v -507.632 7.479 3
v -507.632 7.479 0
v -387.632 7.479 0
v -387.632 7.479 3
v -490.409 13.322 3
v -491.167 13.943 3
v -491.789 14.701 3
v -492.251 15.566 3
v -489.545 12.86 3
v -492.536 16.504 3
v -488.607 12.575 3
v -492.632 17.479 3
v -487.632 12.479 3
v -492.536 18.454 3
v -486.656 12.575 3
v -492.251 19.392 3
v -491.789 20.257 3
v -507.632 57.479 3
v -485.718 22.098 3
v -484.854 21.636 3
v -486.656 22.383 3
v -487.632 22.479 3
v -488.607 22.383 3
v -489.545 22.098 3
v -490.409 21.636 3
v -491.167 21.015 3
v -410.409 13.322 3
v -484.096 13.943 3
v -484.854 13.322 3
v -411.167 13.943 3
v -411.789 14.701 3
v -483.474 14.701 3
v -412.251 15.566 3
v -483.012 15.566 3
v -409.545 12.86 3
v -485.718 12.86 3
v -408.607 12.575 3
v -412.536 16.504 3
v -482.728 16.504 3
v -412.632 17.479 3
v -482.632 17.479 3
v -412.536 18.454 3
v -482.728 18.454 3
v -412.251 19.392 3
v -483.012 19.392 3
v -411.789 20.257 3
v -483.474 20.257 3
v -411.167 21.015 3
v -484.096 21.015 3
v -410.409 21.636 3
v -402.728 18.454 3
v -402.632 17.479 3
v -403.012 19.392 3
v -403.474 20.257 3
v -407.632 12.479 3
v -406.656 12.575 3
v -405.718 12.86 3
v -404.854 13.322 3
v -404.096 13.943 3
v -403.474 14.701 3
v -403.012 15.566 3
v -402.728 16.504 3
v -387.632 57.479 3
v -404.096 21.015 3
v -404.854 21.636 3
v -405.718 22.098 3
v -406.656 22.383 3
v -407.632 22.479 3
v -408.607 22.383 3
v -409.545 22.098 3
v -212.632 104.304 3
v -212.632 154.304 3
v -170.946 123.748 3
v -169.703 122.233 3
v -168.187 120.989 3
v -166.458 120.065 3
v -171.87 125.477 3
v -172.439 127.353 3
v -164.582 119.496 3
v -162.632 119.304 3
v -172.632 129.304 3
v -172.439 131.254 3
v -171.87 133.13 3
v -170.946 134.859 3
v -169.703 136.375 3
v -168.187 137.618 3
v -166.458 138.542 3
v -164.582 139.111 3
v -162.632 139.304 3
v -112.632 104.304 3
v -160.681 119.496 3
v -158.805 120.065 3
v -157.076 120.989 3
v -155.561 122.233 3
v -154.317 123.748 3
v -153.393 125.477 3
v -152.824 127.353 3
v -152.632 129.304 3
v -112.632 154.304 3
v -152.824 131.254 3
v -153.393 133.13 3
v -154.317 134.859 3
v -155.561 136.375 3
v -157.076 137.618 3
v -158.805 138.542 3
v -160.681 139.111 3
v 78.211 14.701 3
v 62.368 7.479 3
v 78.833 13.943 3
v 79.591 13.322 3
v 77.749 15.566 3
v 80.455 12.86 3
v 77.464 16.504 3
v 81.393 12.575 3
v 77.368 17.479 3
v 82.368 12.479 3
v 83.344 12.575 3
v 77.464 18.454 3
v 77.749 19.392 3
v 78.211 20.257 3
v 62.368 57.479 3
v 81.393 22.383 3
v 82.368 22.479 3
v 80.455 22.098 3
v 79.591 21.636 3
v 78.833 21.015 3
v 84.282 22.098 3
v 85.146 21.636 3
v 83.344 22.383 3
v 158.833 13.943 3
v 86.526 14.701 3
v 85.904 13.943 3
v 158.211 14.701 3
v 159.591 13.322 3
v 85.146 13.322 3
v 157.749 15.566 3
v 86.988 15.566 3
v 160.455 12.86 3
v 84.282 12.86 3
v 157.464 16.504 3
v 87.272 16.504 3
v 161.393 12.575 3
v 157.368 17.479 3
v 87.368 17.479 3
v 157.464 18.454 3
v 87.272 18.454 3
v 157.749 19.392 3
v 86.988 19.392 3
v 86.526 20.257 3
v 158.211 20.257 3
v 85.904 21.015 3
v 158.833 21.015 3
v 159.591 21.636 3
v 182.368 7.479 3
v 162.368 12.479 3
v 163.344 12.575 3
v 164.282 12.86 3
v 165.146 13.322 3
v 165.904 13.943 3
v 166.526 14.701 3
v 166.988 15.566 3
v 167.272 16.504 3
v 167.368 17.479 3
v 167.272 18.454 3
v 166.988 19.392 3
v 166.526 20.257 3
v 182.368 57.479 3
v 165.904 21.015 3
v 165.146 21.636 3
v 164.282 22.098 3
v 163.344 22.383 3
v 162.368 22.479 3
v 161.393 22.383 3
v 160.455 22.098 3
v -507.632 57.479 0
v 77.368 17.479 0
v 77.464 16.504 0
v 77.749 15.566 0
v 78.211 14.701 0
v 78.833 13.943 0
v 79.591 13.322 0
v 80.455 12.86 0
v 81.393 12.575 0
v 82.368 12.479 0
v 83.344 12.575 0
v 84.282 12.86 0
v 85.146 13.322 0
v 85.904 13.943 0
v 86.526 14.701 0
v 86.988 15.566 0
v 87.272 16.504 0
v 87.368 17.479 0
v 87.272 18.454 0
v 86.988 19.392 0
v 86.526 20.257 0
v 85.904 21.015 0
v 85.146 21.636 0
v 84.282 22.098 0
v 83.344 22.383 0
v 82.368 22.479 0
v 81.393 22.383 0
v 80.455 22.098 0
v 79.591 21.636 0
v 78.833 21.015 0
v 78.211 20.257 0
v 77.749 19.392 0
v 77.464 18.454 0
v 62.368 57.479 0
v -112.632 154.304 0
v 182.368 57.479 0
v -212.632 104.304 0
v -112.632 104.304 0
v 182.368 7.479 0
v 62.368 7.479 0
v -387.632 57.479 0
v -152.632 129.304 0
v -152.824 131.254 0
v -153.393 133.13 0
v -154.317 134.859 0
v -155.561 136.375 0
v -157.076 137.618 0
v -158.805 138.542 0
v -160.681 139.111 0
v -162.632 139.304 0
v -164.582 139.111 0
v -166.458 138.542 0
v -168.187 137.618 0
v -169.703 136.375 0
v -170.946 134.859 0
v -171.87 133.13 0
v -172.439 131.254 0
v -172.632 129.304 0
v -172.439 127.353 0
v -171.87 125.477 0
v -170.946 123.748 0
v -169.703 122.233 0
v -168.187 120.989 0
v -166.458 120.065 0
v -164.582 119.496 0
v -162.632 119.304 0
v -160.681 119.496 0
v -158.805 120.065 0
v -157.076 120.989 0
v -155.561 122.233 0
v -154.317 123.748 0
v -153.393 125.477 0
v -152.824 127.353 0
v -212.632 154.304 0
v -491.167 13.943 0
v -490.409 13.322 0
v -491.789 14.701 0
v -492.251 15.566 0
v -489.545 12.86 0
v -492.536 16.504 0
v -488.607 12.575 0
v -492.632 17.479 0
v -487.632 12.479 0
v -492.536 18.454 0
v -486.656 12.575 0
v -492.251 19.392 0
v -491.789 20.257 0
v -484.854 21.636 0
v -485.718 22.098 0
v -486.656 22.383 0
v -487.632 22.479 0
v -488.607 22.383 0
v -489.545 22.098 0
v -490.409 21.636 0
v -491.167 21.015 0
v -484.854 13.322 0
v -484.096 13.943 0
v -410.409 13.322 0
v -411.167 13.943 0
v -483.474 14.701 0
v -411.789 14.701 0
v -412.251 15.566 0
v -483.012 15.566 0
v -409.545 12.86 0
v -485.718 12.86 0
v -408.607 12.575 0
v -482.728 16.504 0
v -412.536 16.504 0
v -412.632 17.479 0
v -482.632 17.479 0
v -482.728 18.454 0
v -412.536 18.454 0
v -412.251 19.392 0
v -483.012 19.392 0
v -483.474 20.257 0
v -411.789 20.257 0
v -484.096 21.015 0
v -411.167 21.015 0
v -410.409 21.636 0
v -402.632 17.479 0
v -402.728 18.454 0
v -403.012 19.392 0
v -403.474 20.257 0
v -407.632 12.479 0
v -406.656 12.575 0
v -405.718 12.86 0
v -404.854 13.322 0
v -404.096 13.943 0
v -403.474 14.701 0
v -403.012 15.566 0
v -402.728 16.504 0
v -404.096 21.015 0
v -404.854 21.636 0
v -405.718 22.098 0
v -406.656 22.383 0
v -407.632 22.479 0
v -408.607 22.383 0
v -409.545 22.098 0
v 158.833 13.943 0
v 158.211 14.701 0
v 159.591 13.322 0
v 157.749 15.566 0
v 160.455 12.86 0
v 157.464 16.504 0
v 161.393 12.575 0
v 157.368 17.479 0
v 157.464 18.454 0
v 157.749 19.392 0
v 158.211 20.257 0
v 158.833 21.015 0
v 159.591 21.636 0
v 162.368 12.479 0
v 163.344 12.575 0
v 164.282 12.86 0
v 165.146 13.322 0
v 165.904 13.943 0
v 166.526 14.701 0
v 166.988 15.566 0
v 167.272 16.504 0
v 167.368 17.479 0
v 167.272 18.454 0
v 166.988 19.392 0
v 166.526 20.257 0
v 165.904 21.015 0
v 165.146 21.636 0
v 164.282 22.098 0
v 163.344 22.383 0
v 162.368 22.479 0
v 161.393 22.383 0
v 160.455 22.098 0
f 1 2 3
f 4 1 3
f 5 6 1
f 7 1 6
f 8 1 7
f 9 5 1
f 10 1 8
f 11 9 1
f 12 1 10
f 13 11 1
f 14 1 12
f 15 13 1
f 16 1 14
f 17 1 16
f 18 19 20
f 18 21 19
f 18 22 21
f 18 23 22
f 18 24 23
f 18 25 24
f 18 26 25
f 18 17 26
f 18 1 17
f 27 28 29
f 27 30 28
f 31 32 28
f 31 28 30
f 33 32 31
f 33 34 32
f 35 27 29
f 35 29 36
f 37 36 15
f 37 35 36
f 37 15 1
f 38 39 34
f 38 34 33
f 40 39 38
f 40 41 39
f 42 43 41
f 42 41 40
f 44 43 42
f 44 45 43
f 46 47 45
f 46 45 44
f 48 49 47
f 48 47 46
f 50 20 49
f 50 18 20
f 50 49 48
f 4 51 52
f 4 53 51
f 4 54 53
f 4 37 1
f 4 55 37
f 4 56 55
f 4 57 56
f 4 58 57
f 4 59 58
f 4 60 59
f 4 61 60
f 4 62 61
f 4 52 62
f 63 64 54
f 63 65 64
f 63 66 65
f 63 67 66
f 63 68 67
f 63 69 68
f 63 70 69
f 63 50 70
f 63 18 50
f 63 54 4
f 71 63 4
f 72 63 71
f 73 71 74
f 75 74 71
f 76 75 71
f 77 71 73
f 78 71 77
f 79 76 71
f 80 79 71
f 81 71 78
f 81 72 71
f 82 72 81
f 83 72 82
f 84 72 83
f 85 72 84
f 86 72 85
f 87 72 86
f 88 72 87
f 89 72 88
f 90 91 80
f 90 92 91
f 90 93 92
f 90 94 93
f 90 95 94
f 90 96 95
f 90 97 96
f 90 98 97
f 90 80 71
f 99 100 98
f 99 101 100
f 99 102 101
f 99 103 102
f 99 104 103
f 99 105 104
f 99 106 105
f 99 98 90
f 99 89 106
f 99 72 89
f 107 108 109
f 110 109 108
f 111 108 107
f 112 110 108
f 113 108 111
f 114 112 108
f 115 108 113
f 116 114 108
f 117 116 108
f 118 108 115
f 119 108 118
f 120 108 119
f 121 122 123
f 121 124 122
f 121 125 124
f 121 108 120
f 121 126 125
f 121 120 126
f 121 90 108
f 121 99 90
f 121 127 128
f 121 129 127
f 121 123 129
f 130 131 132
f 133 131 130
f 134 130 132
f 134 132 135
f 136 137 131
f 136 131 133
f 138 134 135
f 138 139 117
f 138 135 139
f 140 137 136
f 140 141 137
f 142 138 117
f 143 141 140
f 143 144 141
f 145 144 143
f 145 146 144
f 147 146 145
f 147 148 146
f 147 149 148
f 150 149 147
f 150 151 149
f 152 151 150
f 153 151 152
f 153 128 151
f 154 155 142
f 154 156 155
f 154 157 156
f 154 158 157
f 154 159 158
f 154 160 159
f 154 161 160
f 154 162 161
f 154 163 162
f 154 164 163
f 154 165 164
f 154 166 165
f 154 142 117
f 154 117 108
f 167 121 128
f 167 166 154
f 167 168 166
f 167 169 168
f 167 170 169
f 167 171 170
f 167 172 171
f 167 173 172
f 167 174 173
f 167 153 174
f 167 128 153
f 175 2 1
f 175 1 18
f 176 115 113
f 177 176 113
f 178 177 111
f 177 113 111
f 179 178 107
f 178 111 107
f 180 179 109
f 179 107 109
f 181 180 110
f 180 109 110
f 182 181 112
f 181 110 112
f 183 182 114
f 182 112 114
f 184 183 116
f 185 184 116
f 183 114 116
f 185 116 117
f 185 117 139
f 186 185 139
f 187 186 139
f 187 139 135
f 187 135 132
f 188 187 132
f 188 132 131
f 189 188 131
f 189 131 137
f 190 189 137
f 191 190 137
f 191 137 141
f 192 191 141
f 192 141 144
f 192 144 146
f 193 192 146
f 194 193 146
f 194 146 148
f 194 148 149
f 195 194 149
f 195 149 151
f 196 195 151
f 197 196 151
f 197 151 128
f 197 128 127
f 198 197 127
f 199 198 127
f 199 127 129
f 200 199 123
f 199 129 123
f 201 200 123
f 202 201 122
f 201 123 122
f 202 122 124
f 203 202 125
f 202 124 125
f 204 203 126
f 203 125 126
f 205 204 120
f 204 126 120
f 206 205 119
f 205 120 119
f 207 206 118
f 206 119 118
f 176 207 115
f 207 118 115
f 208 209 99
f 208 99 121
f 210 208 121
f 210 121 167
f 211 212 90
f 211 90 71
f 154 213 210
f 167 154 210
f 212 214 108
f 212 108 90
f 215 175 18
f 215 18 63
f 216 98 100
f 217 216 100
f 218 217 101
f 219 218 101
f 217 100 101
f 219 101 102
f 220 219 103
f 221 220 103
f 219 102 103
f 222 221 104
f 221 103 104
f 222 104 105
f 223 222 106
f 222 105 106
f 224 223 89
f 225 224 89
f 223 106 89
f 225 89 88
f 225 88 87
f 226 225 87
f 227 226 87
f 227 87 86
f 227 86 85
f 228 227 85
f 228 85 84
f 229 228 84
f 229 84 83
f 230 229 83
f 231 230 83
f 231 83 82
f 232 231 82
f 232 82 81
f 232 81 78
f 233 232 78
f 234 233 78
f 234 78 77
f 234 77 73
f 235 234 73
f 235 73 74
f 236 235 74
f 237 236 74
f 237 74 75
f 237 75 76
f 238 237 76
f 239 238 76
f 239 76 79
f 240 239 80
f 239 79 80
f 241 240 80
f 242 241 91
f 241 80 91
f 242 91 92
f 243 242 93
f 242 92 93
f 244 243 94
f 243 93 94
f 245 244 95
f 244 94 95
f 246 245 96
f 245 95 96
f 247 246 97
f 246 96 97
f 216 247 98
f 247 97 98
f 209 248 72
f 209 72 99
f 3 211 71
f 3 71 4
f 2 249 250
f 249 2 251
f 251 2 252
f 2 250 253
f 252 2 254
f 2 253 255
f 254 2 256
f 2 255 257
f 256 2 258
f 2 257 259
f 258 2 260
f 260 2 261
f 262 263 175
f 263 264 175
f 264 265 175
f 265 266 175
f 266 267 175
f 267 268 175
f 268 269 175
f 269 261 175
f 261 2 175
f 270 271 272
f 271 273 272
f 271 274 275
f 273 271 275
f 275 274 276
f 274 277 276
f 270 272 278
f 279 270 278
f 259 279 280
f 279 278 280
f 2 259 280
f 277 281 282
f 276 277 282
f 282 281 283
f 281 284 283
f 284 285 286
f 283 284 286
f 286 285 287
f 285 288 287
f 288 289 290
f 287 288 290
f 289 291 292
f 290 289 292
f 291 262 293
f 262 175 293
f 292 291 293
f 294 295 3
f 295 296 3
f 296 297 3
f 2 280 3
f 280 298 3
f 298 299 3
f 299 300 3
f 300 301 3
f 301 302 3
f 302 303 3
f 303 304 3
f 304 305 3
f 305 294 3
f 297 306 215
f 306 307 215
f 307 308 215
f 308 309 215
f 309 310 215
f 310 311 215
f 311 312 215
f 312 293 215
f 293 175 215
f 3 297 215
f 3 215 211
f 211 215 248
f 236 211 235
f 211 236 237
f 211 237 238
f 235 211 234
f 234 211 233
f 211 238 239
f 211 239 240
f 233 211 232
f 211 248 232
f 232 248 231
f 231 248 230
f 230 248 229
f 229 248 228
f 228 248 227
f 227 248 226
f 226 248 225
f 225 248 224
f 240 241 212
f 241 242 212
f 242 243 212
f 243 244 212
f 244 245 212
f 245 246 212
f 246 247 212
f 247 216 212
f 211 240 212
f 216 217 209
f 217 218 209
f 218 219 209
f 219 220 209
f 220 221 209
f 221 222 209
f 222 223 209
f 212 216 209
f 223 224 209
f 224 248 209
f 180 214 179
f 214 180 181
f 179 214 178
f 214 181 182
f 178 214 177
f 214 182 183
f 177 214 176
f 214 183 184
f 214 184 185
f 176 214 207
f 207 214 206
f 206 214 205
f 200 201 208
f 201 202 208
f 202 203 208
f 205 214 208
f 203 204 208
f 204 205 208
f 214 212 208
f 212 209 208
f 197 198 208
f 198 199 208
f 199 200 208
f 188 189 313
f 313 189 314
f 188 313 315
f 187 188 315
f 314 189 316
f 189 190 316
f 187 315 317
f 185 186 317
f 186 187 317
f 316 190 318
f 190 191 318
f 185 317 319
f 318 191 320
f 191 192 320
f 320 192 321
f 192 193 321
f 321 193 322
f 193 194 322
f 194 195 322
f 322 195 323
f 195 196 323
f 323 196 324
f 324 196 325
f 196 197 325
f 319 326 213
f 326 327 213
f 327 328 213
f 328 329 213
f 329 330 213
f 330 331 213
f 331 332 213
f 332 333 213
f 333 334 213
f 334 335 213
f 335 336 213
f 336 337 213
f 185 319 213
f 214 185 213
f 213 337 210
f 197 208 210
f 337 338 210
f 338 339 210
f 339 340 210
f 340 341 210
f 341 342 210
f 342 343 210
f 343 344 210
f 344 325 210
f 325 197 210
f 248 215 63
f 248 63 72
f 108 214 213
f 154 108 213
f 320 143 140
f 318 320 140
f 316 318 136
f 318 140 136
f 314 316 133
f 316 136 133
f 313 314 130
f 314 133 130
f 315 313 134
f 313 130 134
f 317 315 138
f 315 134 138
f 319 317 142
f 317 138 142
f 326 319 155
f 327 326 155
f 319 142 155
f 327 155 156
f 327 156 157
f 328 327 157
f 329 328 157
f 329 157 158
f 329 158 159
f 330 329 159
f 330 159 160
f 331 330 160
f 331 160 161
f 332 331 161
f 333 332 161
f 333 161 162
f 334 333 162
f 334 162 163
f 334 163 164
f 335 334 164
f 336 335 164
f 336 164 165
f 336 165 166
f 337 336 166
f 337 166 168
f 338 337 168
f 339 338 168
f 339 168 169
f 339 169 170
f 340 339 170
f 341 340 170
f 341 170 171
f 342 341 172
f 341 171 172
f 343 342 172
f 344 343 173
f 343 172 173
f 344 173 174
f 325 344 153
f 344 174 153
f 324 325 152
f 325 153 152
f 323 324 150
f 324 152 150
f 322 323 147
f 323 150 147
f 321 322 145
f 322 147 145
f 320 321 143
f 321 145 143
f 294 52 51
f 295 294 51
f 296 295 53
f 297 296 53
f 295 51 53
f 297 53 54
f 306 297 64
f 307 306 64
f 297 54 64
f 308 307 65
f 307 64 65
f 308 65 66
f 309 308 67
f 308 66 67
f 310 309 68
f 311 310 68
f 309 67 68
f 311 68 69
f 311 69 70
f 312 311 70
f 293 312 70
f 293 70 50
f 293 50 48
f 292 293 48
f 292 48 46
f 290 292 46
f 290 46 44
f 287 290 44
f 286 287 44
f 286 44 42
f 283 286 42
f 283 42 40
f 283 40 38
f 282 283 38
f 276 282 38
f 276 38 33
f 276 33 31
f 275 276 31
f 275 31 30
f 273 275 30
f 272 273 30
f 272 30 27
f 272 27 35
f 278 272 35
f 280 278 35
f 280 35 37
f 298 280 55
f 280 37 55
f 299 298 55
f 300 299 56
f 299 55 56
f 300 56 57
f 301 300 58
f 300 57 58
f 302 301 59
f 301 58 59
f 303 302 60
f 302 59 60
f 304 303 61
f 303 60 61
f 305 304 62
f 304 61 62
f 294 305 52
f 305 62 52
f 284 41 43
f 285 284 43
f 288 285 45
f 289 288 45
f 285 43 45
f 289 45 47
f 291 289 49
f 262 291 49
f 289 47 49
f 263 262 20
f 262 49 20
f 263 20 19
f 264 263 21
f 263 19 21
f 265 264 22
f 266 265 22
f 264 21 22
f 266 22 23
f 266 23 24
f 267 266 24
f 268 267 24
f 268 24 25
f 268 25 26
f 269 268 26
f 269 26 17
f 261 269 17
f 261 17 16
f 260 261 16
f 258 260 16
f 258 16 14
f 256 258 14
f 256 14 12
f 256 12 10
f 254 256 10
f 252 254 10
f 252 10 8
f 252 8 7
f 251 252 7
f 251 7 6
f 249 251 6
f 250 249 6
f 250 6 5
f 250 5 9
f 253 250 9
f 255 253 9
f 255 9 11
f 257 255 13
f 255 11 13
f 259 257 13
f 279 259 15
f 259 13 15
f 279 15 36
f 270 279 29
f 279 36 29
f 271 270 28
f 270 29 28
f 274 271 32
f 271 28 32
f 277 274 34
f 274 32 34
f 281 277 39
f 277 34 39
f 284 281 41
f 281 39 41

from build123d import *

# Parameters (mm, degrees)
SKETCH1_W           = 120
SKETCH1_H           = 50
BOSS_EXTRUDE1_DEPTH = 3
SKETCH2_R           = 5
SKETCH2_R_2         = 10
CUT_EXTRUDE1_DEPTH  = 531.57368012


with BuildPart() as part:
    # Sketch1 → Boss-Extrude1 (new body)
    with BuildSketch(Plane.XY):
        with Locations((122.368410373, 32.479010759)):
            Rectangle(SKETCH1_W, SKETCH1_H)
        Polygon((-387.631589627, 7.479010759), (-387.631589627, 57.479010759), (-212.631589627, 154.303594414), (-112.631589627, 154.303594414), (62.368410373, 57.479010759), (62.368410373, 7.479010759), (-112.631589627, 104.303594414), (-212.631589627, 104.303594414), align=None)
        with Locations((-447.631589627, 32.479010759)):
            Rectangle(SKETCH1_W, SKETCH1_H)
    extrude(amount=BOSS_EXTRUDE1_DEPTH)

    # Sketch2 → Cut-Extrude1 (cut, through all)
    with BuildSketch(Plane.XY.offset(3)):
        with Locations((-487.631589627, 17.479010759)):
            Circle(SKETCH2_R)
        with Locations((-407.631589627, 17.479010759)):
            Circle(SKETCH2_R)
        with Locations(Location((82.368410373, 17.479010759, 0), (0, 0, 180))):
            Circle(SKETCH2_R)
        with Locations(Location((162.368410373, 17.479010759, 0), (0, 0, 180))):
            Circle(SKETCH2_R)
        with Locations((-162.631589627, 129.303594414)):
            Circle(SKETCH2_R_2)
    extrude(amount=-CUT_EXTRUDE1_DEPTH, mode=Mode.SUBTRACT)


solid = part.part
